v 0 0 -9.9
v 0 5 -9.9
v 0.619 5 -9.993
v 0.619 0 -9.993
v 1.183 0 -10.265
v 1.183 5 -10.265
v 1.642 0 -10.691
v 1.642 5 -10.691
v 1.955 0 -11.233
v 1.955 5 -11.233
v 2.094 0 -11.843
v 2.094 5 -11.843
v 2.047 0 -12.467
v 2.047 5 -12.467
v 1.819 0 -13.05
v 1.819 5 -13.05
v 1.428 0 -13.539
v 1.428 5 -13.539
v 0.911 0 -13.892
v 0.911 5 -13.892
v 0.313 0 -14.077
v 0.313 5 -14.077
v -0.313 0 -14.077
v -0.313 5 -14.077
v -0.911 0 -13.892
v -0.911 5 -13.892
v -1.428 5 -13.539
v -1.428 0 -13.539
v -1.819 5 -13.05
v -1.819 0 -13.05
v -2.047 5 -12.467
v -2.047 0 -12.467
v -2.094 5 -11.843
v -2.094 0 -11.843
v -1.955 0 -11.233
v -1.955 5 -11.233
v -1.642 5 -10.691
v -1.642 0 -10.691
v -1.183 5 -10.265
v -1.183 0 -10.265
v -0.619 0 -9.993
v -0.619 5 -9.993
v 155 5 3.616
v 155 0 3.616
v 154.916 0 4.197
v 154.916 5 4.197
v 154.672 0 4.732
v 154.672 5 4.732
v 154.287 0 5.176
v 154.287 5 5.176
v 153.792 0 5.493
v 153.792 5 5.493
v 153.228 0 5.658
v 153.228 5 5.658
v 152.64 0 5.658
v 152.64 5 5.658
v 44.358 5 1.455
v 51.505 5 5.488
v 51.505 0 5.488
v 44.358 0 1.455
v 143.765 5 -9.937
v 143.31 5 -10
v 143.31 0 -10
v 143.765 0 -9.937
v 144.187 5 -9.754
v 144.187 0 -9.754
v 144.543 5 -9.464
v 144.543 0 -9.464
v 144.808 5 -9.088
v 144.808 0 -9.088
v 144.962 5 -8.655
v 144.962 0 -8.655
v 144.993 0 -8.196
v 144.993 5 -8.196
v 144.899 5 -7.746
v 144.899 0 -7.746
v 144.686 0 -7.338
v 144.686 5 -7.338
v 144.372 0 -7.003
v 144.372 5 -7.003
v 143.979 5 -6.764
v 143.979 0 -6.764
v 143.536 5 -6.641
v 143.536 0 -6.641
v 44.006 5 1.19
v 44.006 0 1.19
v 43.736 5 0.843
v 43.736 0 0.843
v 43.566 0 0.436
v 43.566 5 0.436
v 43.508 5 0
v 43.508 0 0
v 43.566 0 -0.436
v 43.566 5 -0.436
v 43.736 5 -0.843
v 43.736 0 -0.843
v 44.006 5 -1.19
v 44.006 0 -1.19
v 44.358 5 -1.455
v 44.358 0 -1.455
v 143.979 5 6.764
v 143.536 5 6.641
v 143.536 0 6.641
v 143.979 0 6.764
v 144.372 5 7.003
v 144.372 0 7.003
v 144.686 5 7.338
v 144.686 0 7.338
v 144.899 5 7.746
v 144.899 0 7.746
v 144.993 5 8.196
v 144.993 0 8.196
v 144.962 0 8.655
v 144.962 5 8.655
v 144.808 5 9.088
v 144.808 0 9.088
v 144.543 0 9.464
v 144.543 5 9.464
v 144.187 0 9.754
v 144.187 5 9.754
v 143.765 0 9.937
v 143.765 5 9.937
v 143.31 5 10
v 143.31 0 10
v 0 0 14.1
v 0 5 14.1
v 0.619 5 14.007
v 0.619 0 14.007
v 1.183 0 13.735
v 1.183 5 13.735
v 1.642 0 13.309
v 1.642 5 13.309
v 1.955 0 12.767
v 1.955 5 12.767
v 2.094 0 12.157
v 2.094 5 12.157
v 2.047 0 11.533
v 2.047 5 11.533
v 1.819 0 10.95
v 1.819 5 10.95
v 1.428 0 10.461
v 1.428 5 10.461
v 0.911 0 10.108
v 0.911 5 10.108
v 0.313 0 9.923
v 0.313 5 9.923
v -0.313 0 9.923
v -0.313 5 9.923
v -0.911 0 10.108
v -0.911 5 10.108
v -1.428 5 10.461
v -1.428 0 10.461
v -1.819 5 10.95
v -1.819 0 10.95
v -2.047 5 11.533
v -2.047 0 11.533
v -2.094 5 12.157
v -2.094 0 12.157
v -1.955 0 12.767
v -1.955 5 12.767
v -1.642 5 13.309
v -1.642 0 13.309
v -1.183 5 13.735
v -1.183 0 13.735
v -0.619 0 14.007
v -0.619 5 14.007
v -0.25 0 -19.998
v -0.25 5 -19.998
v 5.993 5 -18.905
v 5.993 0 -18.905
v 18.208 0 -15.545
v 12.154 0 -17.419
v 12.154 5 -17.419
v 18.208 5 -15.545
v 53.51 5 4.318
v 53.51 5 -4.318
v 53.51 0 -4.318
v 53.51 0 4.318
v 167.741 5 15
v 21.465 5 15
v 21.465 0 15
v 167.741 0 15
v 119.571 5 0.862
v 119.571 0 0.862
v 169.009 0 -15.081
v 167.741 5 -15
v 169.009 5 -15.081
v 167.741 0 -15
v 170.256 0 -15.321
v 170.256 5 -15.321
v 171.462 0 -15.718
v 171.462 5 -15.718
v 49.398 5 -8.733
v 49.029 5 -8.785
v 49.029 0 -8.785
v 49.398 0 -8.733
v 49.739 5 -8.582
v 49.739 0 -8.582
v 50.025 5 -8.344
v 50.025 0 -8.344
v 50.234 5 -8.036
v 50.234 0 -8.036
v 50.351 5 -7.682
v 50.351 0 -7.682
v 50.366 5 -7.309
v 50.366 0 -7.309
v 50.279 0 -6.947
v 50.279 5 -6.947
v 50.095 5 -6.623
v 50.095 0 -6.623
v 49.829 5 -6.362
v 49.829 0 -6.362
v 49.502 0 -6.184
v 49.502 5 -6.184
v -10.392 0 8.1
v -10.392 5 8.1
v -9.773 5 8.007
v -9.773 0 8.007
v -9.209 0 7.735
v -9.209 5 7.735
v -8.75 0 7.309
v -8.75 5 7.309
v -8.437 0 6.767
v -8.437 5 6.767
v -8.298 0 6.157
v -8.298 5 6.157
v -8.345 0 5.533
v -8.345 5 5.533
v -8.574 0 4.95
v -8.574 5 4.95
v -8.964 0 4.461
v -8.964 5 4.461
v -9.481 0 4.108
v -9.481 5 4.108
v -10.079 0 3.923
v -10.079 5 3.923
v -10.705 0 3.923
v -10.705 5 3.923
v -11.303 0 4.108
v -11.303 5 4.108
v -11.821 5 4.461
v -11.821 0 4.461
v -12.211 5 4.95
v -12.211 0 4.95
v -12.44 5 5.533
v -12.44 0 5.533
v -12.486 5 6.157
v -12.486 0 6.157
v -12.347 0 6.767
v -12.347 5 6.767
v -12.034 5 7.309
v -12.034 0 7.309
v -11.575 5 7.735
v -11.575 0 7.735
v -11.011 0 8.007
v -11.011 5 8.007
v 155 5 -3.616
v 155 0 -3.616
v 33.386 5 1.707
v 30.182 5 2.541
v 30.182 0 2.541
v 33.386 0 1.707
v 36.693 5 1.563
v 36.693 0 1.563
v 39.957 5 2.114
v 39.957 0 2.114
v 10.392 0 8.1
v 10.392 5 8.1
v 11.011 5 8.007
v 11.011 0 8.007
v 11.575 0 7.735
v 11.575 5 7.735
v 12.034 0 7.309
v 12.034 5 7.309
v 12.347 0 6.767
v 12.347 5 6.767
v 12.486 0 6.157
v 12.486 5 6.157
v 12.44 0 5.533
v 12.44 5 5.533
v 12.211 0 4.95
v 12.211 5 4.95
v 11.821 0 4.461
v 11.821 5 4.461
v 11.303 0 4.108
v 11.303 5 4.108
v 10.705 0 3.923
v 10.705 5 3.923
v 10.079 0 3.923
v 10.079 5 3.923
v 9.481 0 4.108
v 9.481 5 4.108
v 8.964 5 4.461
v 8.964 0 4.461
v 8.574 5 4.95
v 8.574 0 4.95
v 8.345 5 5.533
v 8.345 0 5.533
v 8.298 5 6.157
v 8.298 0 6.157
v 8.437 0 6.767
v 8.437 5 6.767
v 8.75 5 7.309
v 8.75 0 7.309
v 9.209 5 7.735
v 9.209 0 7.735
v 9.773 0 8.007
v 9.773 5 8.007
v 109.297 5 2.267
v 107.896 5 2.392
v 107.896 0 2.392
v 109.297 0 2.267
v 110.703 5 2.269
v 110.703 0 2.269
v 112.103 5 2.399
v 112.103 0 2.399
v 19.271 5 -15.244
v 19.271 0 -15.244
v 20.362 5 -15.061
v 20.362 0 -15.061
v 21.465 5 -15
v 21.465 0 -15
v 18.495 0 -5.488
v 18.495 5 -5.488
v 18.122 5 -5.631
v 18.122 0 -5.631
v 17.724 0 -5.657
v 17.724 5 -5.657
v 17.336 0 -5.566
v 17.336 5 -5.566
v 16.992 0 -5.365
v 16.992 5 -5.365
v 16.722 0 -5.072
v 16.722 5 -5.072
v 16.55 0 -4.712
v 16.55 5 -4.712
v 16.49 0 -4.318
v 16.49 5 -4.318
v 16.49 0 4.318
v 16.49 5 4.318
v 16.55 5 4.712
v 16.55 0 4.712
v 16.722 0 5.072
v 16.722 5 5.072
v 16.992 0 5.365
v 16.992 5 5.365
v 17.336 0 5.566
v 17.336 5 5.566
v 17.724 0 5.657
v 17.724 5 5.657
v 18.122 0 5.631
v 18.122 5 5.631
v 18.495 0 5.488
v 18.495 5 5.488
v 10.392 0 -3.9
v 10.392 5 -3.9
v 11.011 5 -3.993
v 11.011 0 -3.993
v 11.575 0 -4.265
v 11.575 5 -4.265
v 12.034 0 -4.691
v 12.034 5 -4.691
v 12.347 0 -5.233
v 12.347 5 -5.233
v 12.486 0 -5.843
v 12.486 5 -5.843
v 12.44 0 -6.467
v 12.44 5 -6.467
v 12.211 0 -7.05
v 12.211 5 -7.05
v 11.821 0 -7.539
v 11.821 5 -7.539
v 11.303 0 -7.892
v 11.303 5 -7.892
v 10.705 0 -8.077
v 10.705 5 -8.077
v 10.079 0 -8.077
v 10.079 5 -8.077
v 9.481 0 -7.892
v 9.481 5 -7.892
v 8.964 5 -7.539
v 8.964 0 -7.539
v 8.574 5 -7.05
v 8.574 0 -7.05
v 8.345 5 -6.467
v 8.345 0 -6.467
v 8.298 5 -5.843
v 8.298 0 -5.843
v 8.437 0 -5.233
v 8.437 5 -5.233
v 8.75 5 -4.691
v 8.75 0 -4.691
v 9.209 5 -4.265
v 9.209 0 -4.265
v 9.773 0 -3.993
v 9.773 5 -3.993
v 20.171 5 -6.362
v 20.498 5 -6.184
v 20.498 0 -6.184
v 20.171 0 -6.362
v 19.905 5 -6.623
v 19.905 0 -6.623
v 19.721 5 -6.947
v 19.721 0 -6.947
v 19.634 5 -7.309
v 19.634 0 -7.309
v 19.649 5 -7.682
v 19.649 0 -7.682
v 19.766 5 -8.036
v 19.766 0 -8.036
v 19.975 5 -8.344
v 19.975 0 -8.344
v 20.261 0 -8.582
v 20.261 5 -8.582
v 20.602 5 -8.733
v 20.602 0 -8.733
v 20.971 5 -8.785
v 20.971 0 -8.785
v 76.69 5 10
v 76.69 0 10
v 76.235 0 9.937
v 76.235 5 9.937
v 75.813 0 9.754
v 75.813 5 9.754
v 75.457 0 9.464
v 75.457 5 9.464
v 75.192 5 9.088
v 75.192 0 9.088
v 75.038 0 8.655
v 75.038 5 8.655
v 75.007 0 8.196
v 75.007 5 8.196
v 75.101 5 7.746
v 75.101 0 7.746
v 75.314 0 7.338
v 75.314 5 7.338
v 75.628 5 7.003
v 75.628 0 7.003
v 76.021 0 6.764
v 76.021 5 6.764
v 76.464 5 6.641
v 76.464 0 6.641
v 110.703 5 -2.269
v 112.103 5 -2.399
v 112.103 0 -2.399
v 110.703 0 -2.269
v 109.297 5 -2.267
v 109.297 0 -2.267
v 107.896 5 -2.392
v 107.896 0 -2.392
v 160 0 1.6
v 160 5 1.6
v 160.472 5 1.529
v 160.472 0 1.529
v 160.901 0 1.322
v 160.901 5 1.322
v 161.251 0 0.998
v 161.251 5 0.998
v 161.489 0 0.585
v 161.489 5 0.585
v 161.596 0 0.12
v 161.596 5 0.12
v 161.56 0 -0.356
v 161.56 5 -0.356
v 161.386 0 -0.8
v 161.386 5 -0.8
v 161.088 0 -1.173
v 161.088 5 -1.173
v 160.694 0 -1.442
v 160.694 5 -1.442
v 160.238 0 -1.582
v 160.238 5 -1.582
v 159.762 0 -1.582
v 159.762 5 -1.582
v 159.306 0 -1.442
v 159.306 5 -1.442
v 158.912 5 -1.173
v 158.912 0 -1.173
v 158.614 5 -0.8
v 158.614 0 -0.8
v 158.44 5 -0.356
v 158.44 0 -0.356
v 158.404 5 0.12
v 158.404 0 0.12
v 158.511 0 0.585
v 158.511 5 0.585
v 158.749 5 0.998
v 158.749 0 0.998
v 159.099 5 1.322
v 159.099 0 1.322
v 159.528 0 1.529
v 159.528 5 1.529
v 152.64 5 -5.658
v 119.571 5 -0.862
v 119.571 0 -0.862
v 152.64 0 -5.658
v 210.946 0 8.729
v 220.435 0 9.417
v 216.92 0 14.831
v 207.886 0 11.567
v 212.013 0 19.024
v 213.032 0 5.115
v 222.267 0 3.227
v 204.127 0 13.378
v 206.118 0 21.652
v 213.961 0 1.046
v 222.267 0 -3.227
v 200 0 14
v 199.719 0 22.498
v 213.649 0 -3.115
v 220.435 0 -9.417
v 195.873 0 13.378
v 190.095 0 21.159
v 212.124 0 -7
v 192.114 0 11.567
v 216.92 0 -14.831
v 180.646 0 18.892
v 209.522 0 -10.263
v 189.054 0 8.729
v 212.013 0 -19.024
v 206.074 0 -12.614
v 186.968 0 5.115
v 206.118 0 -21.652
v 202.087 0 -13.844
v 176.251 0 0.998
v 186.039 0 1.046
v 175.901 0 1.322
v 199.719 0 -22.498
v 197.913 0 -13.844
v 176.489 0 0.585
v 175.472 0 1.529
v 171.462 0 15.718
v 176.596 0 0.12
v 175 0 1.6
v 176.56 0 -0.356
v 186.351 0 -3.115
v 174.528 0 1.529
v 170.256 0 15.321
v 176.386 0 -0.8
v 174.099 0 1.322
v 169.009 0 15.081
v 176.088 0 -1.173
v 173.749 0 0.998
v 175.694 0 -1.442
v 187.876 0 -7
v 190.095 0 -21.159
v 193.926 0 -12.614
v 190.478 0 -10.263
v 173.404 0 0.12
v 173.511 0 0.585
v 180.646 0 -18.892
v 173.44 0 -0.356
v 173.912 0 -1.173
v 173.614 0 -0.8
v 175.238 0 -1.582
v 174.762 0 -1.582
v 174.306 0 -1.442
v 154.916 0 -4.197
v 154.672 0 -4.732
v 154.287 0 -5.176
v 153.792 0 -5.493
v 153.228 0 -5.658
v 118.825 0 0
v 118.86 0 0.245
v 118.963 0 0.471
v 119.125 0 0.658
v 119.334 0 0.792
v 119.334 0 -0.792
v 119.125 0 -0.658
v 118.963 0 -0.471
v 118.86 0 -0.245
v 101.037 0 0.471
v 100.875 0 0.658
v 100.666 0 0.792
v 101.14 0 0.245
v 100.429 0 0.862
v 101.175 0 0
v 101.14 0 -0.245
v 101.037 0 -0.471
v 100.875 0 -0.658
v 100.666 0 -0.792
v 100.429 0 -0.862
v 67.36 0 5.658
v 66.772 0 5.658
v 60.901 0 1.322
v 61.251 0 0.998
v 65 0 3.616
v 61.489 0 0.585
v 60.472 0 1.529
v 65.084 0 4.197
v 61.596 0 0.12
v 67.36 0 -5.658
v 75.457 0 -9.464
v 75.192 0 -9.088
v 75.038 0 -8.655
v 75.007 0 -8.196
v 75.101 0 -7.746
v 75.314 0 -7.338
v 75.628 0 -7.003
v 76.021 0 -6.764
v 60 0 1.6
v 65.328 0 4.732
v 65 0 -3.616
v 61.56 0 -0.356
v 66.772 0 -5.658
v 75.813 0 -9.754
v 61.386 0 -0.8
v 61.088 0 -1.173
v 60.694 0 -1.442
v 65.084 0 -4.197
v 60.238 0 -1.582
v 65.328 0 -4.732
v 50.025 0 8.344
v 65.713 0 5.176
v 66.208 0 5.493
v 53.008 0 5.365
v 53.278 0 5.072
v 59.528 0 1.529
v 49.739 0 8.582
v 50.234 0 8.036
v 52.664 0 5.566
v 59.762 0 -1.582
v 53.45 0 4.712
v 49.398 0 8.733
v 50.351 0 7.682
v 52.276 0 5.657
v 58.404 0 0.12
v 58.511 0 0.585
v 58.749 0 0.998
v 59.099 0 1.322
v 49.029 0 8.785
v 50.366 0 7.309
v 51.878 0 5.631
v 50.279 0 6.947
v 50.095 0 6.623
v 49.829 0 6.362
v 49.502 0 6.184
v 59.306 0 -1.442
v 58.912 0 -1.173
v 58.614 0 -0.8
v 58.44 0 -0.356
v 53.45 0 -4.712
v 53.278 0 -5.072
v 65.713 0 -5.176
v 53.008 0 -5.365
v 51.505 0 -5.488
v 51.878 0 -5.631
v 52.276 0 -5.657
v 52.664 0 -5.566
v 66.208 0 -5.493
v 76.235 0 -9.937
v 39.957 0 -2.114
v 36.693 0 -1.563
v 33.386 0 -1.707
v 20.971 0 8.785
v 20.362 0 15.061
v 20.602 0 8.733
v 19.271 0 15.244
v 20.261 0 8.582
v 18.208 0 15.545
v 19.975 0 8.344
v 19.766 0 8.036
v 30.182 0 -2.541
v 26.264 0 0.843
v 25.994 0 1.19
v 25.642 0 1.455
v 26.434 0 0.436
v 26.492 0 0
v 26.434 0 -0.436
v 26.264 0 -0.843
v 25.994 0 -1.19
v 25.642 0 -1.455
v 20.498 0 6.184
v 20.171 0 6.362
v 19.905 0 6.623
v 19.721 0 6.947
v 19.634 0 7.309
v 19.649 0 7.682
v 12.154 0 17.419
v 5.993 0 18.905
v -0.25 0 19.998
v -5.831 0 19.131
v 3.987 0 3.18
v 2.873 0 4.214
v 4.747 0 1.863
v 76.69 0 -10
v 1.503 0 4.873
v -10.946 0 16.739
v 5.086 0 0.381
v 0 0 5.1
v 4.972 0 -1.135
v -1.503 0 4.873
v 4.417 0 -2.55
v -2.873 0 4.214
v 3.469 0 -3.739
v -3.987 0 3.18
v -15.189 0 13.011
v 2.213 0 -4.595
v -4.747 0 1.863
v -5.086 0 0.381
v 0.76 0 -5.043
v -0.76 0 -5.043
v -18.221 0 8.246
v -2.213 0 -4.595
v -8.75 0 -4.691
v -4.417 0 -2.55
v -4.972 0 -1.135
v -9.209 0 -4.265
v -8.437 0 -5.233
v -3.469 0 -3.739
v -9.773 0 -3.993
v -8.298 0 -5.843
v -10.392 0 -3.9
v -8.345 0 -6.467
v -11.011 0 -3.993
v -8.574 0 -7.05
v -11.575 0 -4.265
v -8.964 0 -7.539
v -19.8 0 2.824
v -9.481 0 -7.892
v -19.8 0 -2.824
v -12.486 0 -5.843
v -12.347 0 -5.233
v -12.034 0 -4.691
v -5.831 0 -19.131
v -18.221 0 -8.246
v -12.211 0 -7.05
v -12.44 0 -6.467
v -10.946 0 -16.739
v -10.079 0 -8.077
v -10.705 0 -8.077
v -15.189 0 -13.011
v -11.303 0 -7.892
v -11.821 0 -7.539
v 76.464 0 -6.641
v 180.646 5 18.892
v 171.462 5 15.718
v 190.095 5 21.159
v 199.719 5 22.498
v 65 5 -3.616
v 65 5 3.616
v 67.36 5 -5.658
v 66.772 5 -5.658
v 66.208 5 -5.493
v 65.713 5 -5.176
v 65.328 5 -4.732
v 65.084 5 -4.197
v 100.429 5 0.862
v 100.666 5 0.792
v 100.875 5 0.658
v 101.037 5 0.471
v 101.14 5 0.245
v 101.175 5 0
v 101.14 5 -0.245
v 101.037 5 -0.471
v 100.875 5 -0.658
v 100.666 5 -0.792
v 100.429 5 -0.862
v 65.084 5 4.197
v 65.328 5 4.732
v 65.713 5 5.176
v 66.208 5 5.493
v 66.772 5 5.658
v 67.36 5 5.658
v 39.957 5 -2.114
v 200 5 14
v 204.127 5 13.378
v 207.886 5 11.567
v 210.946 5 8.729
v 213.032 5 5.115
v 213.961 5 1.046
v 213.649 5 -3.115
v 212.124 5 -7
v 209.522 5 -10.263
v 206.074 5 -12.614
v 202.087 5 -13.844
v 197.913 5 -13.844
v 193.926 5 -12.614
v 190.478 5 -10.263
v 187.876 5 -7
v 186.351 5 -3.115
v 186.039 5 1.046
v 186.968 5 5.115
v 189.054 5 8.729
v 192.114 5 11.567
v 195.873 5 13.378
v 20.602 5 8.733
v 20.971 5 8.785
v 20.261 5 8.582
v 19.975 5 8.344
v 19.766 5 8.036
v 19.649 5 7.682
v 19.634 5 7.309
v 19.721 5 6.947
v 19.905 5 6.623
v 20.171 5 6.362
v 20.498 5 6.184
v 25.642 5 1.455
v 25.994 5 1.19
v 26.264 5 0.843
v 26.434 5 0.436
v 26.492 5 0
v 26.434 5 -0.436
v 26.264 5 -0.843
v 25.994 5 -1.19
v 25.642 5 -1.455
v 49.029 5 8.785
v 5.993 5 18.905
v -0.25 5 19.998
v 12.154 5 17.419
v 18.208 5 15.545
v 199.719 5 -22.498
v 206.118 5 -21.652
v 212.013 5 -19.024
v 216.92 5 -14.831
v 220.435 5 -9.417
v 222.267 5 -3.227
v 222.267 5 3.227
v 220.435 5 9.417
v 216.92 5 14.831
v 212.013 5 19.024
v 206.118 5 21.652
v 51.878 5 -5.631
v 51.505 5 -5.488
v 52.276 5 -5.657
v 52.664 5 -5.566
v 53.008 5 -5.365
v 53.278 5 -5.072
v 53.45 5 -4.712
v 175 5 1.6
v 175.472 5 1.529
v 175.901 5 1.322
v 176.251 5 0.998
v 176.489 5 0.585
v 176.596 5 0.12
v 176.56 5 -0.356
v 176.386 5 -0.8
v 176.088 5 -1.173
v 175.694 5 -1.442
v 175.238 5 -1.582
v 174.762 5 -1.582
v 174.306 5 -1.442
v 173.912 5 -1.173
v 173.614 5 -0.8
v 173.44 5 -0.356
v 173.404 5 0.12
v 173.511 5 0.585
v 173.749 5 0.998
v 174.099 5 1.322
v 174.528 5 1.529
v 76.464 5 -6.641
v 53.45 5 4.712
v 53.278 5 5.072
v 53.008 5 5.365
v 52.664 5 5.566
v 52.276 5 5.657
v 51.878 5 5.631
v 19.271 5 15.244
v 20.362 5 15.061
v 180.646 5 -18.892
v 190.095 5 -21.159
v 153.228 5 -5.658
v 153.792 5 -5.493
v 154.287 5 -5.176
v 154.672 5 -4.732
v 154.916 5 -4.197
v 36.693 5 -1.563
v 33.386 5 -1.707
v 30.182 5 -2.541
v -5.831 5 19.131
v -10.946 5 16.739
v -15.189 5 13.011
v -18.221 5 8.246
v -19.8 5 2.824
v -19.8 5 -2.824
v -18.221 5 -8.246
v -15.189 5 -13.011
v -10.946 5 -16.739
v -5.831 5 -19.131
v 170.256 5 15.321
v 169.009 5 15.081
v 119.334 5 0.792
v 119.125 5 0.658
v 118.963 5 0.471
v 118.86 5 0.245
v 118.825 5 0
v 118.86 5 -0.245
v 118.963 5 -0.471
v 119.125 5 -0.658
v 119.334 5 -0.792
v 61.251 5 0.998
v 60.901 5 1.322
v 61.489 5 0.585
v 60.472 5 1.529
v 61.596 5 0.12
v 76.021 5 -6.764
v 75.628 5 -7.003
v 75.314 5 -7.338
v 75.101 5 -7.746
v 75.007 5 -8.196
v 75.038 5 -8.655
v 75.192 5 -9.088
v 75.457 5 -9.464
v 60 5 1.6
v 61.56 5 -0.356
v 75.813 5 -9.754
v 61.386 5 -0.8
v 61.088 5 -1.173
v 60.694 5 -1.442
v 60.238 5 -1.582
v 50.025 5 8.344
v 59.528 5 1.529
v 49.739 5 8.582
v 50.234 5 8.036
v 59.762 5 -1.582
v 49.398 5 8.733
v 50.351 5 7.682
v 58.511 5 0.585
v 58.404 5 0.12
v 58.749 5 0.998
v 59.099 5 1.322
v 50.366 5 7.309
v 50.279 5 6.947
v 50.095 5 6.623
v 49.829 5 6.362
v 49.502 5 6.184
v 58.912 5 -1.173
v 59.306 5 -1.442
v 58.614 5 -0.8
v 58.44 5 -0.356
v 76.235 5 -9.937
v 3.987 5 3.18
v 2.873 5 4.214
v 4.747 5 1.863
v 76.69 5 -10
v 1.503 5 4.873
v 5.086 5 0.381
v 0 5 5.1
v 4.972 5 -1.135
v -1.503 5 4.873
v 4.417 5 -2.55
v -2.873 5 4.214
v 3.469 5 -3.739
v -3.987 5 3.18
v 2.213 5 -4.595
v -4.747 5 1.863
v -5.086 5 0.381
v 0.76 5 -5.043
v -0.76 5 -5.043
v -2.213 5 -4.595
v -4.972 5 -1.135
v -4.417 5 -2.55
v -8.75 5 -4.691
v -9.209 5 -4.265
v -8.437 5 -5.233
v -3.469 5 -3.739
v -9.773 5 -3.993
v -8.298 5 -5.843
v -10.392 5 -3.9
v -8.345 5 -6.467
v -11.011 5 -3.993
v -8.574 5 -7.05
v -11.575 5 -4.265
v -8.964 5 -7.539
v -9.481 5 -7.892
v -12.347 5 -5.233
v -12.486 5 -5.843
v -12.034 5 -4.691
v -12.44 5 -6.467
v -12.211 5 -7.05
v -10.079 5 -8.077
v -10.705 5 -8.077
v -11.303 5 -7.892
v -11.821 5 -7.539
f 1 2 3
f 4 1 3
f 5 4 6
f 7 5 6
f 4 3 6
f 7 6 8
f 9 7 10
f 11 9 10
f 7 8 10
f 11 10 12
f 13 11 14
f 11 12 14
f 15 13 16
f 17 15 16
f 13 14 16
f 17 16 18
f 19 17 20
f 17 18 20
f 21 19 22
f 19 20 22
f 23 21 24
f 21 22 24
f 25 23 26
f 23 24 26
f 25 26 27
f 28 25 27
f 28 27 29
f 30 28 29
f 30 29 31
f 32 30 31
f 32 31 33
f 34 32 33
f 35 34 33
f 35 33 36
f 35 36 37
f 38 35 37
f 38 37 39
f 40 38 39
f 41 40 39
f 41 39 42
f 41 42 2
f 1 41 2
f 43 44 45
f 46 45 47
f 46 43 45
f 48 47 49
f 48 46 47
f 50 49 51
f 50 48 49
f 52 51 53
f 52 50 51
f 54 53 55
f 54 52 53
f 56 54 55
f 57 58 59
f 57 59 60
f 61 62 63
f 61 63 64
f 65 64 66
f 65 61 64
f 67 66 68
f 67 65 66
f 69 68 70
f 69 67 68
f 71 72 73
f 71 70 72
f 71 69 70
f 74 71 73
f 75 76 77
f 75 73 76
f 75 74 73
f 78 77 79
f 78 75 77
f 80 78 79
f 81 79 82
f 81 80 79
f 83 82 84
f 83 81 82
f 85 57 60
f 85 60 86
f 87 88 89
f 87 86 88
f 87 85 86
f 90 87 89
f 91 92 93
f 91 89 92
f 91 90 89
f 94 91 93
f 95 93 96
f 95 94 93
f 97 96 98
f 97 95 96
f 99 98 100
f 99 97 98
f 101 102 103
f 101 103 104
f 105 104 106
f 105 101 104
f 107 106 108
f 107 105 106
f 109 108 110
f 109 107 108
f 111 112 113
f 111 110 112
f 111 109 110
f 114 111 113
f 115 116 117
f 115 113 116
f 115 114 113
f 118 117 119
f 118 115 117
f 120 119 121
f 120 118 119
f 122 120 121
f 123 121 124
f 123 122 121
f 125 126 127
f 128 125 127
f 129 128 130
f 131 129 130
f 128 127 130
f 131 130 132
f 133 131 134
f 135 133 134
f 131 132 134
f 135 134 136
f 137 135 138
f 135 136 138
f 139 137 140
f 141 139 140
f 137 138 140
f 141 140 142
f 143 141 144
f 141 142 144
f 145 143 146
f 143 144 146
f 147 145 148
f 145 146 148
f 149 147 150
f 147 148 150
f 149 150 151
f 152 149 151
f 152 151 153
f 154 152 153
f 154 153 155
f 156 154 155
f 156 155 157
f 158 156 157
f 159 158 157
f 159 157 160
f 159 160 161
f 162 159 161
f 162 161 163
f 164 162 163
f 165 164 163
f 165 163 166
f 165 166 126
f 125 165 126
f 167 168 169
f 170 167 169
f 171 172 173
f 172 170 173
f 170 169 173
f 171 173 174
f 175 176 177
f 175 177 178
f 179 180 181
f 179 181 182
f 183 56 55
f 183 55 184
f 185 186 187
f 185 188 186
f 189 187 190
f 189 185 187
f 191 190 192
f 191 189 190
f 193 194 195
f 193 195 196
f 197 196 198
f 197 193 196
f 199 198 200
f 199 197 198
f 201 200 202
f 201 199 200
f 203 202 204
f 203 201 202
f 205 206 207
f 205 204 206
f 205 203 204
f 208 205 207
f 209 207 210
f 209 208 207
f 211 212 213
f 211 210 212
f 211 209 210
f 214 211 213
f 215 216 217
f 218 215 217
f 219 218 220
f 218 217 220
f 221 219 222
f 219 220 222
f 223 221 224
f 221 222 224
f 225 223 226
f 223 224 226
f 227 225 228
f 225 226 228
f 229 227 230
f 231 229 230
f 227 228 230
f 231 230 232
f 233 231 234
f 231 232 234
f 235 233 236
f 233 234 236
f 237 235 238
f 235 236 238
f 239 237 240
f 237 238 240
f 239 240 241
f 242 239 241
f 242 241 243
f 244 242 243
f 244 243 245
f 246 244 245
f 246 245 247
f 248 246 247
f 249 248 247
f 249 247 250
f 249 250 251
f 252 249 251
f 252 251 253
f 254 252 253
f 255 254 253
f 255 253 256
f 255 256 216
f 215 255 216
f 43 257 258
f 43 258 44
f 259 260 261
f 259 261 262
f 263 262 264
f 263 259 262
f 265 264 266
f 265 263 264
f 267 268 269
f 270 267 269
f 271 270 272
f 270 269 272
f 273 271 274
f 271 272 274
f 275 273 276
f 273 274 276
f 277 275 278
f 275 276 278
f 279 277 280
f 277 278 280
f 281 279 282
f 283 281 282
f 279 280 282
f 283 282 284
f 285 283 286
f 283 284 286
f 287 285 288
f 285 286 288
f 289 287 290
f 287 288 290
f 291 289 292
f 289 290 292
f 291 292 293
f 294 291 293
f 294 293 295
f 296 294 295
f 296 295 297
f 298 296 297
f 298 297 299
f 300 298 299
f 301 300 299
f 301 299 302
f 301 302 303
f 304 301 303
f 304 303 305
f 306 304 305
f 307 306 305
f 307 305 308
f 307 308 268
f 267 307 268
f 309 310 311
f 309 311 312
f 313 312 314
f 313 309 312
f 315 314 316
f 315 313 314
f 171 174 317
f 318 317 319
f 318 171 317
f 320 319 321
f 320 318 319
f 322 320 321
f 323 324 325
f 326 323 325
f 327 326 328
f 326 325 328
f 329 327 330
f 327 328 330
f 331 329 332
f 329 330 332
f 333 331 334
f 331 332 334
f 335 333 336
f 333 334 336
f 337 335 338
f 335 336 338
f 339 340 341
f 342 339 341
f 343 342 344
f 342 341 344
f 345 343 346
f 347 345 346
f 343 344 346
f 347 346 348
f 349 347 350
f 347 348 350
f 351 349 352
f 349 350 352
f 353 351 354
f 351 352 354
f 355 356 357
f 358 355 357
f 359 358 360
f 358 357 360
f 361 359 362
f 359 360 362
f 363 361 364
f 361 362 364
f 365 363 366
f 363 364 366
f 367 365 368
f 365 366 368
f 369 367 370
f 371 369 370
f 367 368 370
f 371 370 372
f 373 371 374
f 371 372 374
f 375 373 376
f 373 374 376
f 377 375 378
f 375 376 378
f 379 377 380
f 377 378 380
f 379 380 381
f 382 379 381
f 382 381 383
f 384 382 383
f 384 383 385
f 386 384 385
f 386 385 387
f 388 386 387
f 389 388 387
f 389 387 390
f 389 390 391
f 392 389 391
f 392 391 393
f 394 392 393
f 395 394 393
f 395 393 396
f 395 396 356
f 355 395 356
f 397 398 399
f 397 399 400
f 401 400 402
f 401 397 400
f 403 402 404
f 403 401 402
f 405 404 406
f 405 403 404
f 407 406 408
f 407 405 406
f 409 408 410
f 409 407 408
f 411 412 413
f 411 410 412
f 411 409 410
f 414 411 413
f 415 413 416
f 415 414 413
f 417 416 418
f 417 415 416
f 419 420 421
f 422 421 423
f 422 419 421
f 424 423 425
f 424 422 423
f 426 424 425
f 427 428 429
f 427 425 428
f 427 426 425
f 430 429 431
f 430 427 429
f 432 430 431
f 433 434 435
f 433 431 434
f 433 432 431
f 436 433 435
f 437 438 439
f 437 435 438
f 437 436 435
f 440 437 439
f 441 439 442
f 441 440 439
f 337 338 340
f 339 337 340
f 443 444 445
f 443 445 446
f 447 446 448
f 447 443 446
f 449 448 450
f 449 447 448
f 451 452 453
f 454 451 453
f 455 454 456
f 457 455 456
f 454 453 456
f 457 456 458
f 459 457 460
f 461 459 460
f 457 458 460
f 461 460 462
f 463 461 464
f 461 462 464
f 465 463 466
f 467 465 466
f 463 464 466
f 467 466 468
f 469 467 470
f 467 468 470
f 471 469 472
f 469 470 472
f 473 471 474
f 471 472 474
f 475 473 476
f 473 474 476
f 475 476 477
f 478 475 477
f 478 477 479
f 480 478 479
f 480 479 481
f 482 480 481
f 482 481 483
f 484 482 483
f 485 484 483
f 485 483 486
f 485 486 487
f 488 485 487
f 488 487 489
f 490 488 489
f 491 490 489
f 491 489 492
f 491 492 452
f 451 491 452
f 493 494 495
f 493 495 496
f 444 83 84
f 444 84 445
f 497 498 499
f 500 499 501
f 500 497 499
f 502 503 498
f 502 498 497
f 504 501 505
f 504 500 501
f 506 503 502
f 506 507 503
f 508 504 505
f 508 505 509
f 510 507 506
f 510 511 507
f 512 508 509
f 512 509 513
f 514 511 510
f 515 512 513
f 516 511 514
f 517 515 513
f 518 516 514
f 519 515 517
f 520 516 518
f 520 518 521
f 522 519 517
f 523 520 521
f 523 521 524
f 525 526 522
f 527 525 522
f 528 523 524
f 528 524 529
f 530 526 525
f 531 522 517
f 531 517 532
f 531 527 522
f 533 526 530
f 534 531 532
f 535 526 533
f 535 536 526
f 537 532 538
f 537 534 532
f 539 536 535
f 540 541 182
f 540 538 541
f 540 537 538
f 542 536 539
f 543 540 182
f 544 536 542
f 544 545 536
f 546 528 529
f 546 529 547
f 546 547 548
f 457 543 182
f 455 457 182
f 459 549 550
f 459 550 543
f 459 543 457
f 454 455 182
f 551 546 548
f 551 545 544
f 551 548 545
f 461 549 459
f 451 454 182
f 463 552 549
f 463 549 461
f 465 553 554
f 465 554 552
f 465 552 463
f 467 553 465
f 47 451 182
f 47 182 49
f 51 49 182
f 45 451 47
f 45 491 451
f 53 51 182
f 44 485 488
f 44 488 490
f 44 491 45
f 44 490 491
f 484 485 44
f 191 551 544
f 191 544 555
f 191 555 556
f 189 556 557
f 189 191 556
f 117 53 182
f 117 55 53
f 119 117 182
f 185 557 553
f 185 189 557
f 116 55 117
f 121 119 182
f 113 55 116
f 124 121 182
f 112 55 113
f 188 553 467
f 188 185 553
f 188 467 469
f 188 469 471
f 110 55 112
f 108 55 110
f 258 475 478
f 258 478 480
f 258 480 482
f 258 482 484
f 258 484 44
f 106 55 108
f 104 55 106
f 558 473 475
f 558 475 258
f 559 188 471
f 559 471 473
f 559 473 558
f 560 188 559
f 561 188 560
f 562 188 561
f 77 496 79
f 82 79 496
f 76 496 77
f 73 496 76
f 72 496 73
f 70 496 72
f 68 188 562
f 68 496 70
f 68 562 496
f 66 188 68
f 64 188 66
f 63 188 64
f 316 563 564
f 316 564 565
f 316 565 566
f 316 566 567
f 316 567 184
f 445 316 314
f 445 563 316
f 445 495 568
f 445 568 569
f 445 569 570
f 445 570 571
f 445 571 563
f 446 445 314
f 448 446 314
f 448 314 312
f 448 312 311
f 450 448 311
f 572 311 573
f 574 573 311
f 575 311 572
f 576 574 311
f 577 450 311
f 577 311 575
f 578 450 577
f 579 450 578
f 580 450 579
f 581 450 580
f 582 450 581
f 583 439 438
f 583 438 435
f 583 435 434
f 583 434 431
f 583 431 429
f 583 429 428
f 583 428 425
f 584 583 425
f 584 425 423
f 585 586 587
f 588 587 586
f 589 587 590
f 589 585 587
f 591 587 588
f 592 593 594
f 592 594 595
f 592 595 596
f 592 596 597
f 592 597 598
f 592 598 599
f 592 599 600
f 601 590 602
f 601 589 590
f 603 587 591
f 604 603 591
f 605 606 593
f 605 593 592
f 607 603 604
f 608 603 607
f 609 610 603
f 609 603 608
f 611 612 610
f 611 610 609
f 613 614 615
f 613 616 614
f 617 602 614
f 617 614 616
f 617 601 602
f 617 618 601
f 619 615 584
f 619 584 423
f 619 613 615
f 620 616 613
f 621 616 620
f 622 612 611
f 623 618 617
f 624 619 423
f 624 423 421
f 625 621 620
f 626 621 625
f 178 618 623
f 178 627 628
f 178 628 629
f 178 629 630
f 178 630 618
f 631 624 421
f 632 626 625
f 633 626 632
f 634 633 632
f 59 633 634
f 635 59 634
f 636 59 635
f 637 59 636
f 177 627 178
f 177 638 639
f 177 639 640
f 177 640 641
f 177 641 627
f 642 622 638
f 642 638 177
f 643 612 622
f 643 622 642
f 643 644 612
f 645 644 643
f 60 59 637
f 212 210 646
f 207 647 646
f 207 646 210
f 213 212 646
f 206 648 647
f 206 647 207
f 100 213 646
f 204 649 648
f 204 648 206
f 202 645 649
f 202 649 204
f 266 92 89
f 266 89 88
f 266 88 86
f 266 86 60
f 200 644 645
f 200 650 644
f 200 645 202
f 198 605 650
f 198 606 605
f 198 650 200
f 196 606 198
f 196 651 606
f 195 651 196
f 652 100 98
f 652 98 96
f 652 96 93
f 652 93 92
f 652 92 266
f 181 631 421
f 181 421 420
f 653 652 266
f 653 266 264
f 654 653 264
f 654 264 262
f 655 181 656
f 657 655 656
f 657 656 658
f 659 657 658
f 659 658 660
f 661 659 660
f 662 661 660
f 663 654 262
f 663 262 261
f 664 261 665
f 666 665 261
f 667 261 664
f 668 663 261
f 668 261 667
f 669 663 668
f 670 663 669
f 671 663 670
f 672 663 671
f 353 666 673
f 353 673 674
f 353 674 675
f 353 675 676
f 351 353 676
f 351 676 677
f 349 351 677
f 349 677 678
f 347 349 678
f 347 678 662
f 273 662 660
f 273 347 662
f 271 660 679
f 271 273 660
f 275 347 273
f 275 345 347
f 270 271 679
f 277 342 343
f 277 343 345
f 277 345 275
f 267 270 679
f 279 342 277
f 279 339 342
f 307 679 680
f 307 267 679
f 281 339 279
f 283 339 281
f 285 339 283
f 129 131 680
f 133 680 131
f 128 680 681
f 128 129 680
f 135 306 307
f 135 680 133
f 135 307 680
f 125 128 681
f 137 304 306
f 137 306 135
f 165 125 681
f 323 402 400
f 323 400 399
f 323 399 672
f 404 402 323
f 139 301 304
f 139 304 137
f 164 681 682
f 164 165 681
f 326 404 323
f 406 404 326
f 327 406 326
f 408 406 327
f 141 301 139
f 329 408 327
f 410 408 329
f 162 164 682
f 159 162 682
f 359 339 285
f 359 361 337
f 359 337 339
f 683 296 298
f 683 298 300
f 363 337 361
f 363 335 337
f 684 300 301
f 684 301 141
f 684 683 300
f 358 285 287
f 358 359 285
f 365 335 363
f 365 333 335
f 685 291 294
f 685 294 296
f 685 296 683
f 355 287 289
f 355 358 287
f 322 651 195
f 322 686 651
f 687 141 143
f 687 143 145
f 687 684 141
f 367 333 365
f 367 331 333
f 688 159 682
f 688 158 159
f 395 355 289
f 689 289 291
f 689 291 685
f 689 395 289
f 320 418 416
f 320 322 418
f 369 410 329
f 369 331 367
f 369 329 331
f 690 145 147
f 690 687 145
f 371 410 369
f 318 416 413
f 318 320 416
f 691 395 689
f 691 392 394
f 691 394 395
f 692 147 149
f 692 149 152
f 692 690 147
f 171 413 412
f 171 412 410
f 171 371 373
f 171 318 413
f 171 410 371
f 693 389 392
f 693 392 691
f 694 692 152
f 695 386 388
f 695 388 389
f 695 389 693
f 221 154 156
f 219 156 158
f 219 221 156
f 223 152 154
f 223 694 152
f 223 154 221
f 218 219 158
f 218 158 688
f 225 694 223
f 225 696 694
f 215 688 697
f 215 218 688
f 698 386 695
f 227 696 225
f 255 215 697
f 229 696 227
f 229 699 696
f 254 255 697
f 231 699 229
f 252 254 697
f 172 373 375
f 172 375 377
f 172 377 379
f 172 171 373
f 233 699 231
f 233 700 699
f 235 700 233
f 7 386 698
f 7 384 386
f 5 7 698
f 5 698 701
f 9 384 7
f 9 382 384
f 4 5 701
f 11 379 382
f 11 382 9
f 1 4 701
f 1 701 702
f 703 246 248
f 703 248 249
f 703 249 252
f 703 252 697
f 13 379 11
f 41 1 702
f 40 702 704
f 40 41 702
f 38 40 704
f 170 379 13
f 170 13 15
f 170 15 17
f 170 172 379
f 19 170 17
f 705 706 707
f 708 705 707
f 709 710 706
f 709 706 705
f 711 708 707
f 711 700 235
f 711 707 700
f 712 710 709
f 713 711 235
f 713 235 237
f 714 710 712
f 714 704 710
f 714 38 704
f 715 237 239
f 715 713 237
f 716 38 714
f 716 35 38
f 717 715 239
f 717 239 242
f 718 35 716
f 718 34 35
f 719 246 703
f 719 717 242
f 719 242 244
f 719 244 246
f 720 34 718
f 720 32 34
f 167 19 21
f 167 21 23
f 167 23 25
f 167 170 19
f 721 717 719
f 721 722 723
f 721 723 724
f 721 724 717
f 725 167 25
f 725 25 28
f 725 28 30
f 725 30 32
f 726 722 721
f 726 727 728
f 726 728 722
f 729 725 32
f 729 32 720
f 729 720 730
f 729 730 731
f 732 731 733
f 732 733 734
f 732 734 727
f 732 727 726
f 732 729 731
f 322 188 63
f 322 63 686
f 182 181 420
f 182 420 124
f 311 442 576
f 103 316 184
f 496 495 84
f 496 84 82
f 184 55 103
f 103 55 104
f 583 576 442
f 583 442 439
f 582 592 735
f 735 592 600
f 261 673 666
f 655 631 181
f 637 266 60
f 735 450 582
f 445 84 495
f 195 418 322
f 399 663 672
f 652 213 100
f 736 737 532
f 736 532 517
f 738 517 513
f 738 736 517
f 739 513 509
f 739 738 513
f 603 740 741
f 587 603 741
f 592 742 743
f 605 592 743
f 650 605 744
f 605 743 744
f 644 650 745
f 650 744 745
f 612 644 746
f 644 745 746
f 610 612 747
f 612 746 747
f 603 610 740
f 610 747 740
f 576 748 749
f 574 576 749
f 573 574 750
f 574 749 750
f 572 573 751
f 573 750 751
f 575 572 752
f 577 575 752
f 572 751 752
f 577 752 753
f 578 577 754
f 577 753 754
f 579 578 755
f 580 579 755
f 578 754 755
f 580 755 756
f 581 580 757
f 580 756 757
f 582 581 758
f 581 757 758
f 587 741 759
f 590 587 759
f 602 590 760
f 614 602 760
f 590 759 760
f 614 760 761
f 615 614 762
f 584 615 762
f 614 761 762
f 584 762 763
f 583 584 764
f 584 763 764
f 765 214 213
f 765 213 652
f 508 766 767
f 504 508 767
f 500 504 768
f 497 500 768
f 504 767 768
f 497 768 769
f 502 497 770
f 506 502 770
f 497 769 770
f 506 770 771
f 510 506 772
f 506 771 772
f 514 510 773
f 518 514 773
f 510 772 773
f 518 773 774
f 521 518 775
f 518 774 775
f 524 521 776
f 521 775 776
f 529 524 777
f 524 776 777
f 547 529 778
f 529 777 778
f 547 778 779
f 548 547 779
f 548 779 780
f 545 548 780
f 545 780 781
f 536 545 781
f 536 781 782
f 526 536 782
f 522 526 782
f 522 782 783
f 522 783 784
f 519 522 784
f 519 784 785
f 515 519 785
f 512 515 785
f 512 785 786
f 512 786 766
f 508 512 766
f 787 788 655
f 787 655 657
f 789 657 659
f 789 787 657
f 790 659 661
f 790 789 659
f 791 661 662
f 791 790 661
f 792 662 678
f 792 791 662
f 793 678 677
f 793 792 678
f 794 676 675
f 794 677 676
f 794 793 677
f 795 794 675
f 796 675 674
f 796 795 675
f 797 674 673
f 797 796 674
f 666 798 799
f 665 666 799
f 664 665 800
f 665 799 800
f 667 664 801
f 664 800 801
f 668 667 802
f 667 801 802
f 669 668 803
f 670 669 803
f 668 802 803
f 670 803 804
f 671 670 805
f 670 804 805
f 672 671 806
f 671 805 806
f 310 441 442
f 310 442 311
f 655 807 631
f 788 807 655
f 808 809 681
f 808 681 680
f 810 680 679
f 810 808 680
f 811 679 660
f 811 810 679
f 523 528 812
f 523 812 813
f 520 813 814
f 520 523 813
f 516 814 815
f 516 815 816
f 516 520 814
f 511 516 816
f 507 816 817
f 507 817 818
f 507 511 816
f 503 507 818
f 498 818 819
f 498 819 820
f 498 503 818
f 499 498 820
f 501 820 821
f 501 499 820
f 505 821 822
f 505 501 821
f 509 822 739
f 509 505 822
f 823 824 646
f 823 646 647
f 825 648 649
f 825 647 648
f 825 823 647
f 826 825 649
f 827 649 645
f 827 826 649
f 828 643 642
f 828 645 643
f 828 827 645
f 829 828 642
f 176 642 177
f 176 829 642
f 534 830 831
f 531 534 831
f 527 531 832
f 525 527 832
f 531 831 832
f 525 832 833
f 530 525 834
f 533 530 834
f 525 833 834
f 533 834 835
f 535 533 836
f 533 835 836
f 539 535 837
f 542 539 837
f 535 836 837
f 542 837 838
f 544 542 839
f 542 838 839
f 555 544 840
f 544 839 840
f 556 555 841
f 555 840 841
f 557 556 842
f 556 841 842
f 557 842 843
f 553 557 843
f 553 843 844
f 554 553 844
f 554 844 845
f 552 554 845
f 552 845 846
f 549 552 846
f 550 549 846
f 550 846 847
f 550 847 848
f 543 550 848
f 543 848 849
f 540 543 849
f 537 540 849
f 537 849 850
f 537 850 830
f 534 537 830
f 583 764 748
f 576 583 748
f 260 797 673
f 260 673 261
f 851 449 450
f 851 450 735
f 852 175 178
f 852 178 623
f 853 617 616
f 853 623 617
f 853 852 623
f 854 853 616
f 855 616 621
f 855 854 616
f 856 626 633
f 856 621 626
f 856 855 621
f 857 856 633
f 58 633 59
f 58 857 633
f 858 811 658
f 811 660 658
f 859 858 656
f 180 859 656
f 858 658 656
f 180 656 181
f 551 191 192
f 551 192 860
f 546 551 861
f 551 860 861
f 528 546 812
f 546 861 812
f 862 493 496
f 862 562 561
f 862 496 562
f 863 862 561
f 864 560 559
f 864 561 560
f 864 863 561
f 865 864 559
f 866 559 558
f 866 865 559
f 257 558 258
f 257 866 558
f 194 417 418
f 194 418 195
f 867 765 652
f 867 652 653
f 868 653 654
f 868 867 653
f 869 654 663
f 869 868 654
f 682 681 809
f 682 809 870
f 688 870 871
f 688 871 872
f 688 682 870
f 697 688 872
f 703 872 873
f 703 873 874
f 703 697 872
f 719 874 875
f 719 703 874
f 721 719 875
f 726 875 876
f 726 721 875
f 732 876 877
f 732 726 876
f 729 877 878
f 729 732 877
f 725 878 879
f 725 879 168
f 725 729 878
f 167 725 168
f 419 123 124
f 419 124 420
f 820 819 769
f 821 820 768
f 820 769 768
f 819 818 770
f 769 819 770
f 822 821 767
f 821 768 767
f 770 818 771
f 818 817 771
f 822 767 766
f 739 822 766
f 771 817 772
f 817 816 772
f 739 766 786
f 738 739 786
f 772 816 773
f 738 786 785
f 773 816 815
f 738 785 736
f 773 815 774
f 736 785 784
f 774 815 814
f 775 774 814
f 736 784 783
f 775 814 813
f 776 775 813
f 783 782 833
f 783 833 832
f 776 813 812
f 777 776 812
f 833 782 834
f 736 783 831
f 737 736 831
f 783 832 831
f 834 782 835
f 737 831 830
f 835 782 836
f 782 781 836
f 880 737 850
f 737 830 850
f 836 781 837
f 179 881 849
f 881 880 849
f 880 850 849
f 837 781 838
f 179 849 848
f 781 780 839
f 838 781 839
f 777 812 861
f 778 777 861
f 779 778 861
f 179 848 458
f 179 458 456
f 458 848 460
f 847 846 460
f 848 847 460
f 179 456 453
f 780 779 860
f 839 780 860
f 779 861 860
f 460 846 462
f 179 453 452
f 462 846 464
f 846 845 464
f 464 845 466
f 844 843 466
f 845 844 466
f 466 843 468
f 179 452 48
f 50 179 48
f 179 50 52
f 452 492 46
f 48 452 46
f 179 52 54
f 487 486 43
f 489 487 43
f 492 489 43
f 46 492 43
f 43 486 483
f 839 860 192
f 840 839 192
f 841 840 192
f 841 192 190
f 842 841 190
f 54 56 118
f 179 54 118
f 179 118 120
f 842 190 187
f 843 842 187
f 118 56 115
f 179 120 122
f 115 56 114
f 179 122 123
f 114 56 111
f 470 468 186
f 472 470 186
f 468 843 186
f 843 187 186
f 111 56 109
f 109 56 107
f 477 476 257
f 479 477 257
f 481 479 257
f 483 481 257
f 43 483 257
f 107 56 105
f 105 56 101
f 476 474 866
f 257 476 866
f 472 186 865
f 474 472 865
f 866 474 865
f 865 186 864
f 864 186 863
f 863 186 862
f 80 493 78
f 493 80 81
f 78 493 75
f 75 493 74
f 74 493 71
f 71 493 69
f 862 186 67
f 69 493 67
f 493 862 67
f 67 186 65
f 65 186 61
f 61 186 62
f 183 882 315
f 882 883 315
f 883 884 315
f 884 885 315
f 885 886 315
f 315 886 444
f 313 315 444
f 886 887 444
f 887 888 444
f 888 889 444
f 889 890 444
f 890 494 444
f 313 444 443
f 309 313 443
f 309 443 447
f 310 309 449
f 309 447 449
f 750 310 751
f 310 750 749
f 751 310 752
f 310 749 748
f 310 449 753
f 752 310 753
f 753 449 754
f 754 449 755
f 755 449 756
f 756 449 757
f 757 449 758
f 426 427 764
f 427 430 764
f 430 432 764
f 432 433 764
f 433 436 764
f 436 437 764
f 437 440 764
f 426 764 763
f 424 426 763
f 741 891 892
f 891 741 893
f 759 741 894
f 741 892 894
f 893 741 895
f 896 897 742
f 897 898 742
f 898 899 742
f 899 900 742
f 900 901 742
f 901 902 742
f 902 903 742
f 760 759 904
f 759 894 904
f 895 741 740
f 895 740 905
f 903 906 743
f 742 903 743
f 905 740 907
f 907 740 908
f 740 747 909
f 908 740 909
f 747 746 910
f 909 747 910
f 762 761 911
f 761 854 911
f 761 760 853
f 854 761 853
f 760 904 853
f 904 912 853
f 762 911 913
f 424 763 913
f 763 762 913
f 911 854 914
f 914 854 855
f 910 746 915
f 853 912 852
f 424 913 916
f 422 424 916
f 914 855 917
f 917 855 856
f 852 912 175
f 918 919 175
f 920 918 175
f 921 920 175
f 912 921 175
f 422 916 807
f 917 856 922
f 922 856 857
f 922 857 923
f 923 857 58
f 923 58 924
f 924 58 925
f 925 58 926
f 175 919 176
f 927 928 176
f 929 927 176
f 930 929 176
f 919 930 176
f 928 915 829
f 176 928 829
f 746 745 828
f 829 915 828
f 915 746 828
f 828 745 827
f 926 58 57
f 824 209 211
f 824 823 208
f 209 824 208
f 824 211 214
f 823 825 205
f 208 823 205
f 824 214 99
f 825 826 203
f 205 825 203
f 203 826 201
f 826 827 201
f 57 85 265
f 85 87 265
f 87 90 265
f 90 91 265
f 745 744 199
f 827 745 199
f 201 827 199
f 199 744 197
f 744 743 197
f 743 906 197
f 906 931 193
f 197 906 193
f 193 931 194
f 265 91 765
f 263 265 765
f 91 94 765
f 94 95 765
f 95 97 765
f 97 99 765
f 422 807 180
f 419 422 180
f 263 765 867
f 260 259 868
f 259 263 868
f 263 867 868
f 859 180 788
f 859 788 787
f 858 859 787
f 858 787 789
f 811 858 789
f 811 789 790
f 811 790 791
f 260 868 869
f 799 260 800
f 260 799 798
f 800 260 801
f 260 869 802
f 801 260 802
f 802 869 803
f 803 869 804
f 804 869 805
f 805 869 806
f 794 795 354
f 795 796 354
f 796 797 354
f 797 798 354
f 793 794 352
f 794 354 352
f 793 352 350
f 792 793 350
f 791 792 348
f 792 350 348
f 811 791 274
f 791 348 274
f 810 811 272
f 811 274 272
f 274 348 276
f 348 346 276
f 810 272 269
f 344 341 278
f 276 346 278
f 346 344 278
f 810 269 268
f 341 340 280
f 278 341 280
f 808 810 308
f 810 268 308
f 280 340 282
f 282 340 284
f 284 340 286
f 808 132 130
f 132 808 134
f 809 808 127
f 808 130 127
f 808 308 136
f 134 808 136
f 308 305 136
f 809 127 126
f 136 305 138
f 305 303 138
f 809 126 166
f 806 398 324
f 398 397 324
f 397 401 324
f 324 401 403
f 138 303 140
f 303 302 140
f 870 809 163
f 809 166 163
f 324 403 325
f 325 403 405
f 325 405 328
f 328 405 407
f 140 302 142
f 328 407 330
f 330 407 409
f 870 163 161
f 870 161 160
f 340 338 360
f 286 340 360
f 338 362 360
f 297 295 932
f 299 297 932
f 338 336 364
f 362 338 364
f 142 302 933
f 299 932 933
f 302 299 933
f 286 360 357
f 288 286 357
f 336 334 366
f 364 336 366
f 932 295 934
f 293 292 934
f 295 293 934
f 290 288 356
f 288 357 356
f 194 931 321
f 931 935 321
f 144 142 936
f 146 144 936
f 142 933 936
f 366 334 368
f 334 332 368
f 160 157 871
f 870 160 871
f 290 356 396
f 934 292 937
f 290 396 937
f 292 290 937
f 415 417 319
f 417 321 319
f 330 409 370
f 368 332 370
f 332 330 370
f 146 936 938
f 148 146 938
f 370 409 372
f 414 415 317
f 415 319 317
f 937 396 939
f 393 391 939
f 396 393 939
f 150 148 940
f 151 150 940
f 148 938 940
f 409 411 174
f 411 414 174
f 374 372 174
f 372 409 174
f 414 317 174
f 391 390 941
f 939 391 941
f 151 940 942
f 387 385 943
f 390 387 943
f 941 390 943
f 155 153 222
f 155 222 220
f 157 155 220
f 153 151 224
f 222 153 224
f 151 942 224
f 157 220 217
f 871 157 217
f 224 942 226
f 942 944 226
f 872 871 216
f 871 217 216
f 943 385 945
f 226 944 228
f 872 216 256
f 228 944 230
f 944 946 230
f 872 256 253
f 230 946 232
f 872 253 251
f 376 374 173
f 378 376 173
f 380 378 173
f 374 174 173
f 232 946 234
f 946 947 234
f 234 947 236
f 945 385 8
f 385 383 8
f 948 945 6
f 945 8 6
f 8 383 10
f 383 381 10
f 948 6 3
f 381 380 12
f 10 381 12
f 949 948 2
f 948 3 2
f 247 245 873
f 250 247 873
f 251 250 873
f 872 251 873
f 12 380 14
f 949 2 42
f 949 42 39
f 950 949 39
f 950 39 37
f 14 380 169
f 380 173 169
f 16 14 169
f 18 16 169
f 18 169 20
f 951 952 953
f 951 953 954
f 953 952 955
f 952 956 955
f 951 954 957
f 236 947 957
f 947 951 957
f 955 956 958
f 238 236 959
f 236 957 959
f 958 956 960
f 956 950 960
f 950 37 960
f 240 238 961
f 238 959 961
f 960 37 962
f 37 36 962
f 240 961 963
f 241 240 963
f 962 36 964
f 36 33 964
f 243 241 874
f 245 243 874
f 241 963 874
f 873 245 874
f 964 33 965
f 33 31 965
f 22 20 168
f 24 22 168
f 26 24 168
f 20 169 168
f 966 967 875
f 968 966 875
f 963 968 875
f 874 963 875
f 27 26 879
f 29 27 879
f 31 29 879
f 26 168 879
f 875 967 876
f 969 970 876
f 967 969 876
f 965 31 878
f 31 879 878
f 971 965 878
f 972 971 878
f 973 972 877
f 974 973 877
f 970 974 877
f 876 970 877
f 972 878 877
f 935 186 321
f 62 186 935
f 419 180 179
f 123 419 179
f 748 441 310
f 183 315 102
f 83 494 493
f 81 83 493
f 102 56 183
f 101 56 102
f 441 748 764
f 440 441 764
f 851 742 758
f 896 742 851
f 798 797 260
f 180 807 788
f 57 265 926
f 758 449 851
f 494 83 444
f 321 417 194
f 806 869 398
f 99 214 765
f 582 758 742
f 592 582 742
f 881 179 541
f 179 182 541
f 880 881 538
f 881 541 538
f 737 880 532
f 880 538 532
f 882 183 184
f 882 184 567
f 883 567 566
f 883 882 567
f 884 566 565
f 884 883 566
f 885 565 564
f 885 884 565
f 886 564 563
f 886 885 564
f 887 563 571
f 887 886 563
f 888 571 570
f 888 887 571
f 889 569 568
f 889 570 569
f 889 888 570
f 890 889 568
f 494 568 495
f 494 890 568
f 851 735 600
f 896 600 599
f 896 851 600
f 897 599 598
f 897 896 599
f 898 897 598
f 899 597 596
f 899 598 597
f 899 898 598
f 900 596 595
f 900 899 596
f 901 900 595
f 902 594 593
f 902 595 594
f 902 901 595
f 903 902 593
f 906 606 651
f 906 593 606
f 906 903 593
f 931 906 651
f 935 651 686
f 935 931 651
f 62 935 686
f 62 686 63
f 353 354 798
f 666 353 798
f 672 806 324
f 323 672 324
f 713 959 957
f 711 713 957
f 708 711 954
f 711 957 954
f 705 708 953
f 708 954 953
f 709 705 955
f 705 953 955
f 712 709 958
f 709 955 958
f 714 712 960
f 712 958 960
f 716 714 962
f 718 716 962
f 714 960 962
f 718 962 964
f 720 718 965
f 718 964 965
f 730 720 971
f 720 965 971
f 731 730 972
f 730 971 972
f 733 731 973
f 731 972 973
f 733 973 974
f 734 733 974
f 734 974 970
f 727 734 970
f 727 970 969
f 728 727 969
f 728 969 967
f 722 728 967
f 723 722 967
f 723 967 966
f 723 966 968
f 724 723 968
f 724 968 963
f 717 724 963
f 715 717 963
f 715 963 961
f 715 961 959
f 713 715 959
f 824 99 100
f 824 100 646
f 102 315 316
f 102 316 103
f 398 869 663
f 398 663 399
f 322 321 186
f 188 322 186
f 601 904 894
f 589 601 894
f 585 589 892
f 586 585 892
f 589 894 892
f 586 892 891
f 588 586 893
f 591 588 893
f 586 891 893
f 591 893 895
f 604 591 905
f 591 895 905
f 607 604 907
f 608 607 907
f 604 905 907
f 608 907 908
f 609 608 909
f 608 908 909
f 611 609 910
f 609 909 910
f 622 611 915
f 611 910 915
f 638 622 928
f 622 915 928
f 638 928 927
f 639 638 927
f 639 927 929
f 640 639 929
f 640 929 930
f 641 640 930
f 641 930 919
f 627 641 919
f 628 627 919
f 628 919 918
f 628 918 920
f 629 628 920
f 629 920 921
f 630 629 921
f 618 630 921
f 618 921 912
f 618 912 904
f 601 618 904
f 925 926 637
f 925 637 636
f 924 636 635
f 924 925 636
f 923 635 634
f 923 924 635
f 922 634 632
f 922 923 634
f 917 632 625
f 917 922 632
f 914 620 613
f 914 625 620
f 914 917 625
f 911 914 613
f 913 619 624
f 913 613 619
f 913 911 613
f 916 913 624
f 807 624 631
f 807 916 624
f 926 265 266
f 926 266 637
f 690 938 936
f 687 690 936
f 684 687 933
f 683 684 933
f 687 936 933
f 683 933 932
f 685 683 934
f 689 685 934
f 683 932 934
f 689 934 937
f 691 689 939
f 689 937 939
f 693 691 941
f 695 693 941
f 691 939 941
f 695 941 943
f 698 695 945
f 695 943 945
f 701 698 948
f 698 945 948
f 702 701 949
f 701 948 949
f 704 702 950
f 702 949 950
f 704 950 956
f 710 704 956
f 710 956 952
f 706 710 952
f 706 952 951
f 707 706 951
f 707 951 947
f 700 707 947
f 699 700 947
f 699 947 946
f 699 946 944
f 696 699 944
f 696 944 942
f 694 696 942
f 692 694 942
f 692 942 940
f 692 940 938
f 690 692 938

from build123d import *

# Parameters (mm, degrees)
EXTRUDE_1_DEPTH     = 5
SKETCH_2_R          = 5.1
CUT_EXTRUDE_1_DEPTH = 10
SKETCH_3_R          = 14
CUT_EXTRUDE_2_DEPTH = 10
SKETCH_4_R          = 2.1
CUT_EXTRUDE_3_DEPTH = 10
CUT_EXTRUDE_4_DEPTH = 224.690634583
FILLET_1_R          = 10
SKETCH_12_R         = 1.6
CUT_EXTRUDE_5_DEPTH = 224.690634583
CUT_EXTRUDE_6_DEPTH = 10


with BuildPart() as part:
    # 草图1 → 凸台-拉伸1 (new body)
    with BuildSketch(Plane(origin=(0, 0, 0), x_dir=(1, 0, 0), z_dir=(0, 1, 0))):
        with BuildLine():
            Line((-0.25, 19.998437439), (199.71875, 22.498242119))
            ThreePointArc((199.71875, 22.498242119), (222.5, 0), (199.71875, -22.498242119))
            Line((199.71875, -22.498242119), (-0.25, -19.998437439))
            ThreePointArc((-0.25, -19.998437439), (-20, 0), (-0.25, 19.998437439))
        make_face()
    extrude(amount=EXTRUDE_1_DEPTH)

    # 草图2 → 切除-拉伸1 (cut)
    with BuildSketch(Plane(origin=(0, 5, 0), x_dir=(1, 0, 0), z_dir=(0, 1, 0))):
        with Locations(Location((0, 0, 0), (0, 0, 270))):
            Circle(SKETCH_2_R)
    extrude(amount=-CUT_EXTRUDE_1_DEPTH, mode=Mode.SUBTRACT)

    # 草图3 → 切除-拉伸2 (cut)
    with BuildSketch(Plane(origin=(0, 5, 0), x_dir=(1, 0, 0), z_dir=(0, 1, 0))):
        with Locations(Location((200, 0, 0), (0, 0, 270))):
            Circle(SKETCH_3_R)
    extrude(amount=-CUT_EXTRUDE_2_DEPTH, mode=Mode.SUBTRACT)

    # 草图4 → 切除-拉伸3 (cut)
    with BuildSketch(Plane(origin=(0, 5, 0), x_dir=(1, 0, 0), z_dir=(0, 1, 0))):
        with Locations(Location((0, 12, 0), (0, 0, 270))):
            Circle(SKETCH_4_R)
        with Locations(Location((10.392304845, 6, 0), (0, 0, 270))):
            Circle(SKETCH_4_R)
        with Locations(Location((10.392304845, -6, 0), (0, 0, 270))):
            Circle(SKETCH_4_R)
        with Locations(Location((0, -12, 0), (0, 0, 270))):
            Circle(SKETCH_4_R)
        with Locations(Location((-10.392304845, -6, 0), (0, 0, 270))):
            Circle(SKETCH_4_R)
        with Locations(Location((-10.392304845, 6, 0), (0, 0, 270))):
            Circle(SKETCH_4_R)
    extrude(amount=-CUT_EXTRUDE_3_DEPTH, mode=Mode.SUBTRACT)

    # 草图10 → 切除-拉伸4 (cut, through all)
    with BuildSketch(Plane(origin=(0, 5, 0), x_dir=(1, 0, 0), z_dir=(0, 1, 0))):
        with BuildLine():
            Line((19.75, 15), (169.71875, 15))
            ThreePointArc((169.71875, 15), (184.427162899, 19.915742901), (199.71875, 22.498242119))
            Line((199.71875, 22.498242119), (-0.25, 19.998437439))
            ThreePointArc((-0.25, 19.998437439), (9.879148371, 18.015973695), (19.75, 15))
        make_face()
        with BuildLine():
            Line((19.75, -15), (169.71875, -15))
            ThreePointArc((169.71875, -15), (184.427162899, -19.915742901), (199.71875, -22.498242119))
            Line((199.71875, -22.498242119), (-0.25, -19.998437439))
            ThreePointArc((-0.25, -19.998437439), (9.879148371, -18.015973695), (19.75, -15))
        make_face()
    extrude(amount=-CUT_EXTRUDE_4_DEPTH, mode=Mode.SUBTRACT)

    # 圆角1
    fillet_1_edges = [part.edges().sort_by_distance(p)[0] for p in [
        (169.71875, 2.5, 15),
        (19.75, 2.5, 15),
        (19.75, 2.5, -15),
        (169.71875, 2.5, -15),
    ]]
    fillet(fillet_1_edges, radius=FILLET_1_R)

    # 草图12 → 切除-拉伸5 (cut, through all)
    with BuildSketch(Plane(origin=(0, 5, 0), x_dir=(1, 0, 0), z_dir=(0, 1, 0))):
        with Locations(Location((160, 0, 0), (0, 0, 270))):
            Circle(SKETCH_12_R)
        with Locations(Location((60, 0, 0), (0, 0, 270))):
            Circle(SKETCH_12_R)
        with Locations(Location((175, 0, 0), (0, 0, 270))):
            Circle(SKETCH_12_R)
        with BuildLine():
            Line((76.690146779, 10), (143.309853221, 10))
            ThreePointArc((143.309853221, 10), (144.993003562, 8.426306348), (143.535868598, 6.64129529))
            Line((143.535868598, 6.64129529), (112.102965186, 2.39880546))
            ThreePointArc((112.102965186, 2.39880546), (109.999758761, 2.251989281), (107.896074318, 2.391789195))
            Line((107.896074318, 2.391789195), (76.464131402, 6.64129529))
            ThreePointArc((76.464131402, 6.64129529), (75.006996438, 8.426306348), (76.690146779, 10))
        make_face()
        with BuildLine():
            Line((65, 3.615503909), (65, -3.615503909))
            ThreePointArc((65, -3.615503909), (65.713191903, -5.175920839), (67.359810975, -5.657781105))
            Line((67.359810975, -5.657781105), (100.428751598, -0.862135837))
            ThreePointArc((100.428751598, -0.862135837), (101.174879309, 0), (100.428751598, 0.862135837))
            Line((100.428751598, 0.862135837), (67.359810975, 5.657781105))
            ThreePointArc((67.359810975, 5.657781105), (65.713191903, 5.175920839), (65, 3.615503909))
        make_face()
        with BuildLine():
            Line((155, 3.615503909), (155, -3.615503909))
            ThreePointArc((155, -3.615503909), (154.286808097, -5.175920839), (152.640189025, -5.657781105))
            Line((152.640189025, -5.657781105), (119.571248402, -0.862135837))
            ThreePointArc((119.571248402, -0.862135837), (118.825120691, 0), (119.571248402, 0.862135837))
            Line((119.571248402, 0.862135837), (152.640189025, 5.657781105))
            ThreePointArc((152.640189025, 5.657781105), (154.286808097, 5.175920839), (155, 3.615503909))
        make_face()
        with BuildLine():
            Line((76.464131402, -6.64129529), (107.896074318, -2.391789195))
            ThreePointArc((107.896074318, -2.391789195), (109.999758761, -2.251989281), (112.102965186, -2.39880546))
            Line((112.102965186, -2.39880546), (143.535868598, -6.64129529))
            ThreePointArc((143.535868598, -6.64129529), (144.993003562, -8.426306348), (143.309853221, -10))
            Line((143.309853221, -10), (76.690146779, -10))
            ThreePointArc((76.690146779, -10), (75.006996438, -8.426306348), (76.464131402, -6.64129529))
        make_face()
    extrude(amount=-CUT_EXTRUDE_5_DEPTH, mode=Mode.SUBTRACT)

    # 草图13 → 切除-拉伸6 (cut)
    with BuildSketch(Plane(origin=(0, 5, 0), x_dir=(1, 0, 0), z_dir=(0, 1, 0))):
        with BuildLine():
            Line((20.970819312, 8.785118289), (49.029180688, 8.785118289))
            ThreePointArc((49.029180688, 8.785118289), (50.351263939, 7.681791354), (49.502305324, 6.183624568))
            Line((49.502305324, 6.183624568), (39.957431091, 2.113629648))
            ThreePointArc((39.957431091, 2.113629648), (35.035801099, 1.547966117), (30.182224549, 2.540544414))
            Line((30.182224549, 2.540544414), (20.497694676, 6.183624568))
            ThreePointArc((20.497694676, 6.183624568), (19.648736061, 7.681791354), (20.970819312, 8.785118289))
        make_face()
        with BuildLine():
            Line((16.490400657, 4.317991857), (16.490400657, -4.317991857))
            ThreePointArc((16.490400657, -4.317991857), (17.156548552, -5.478408553), (18.494540137, -5.488330518))
            Line((18.494540137, -5.488330518), (25.642155827, -1.455347803))
            ThreePointArc((25.642155827, -1.455347803), (26.492021725, 0), (25.642155827, 1.455347803))
            Line((25.642155827, 1.455347803), (18.494540137, 5.488330518))
            ThreePointArc((18.494540137, 5.488330518), (17.156548552, 5.478408553), (16.490400657, 4.317991857))
        make_face()
        with BuildLine():
            Line((53.509599343, 4.317991857), (53.509599343, -4.317991857))
            ThreePointArc((53.509599343, -4.317991857), (52.843451448, -5.478408553), (51.505459863, -5.488330518))
            Line((51.505459863, -5.488330518), (44.357844173, -1.455347803))
            ThreePointArc((44.357844173, -1.455347803), (43.507978275, 0), (44.357844173, 1.455347803))
            Line((44.357844173, 1.455347803), (51.505459863, 5.488330518))
            ThreePointArc((51.505459863, 5.488330518), (52.843451448, 5.478408553), (53.509599343, 4.317991857))
        make_face()
        with BuildLine():
            Line((20.497694676, -6.183624568), (30.182224549, -2.540544414))
            ThreePointArc((30.182224549, -2.540544414), (35.035801099, -1.547966117), (39.957431091, -2.113629648))
            Line((39.957431091, -2.113629648), (49.502305324, -6.183624568))
            ThreePointArc((49.502305324, -6.183624568), (50.351263939, -7.681791354), (49.029180688, -8.785118289))
            Line((49.029180688, -8.785118289), (20.970819312, -8.785118289))
            ThreePointArc((20.970819312, -8.785118289), (19.648736061, -7.681791354), (20.497694676, -6.183624568))
        make_face()
    extrude(amount=-CUT_EXTRUDE_6_DEPTH, mode=Mode.SUBTRACT)


solid = part.part
